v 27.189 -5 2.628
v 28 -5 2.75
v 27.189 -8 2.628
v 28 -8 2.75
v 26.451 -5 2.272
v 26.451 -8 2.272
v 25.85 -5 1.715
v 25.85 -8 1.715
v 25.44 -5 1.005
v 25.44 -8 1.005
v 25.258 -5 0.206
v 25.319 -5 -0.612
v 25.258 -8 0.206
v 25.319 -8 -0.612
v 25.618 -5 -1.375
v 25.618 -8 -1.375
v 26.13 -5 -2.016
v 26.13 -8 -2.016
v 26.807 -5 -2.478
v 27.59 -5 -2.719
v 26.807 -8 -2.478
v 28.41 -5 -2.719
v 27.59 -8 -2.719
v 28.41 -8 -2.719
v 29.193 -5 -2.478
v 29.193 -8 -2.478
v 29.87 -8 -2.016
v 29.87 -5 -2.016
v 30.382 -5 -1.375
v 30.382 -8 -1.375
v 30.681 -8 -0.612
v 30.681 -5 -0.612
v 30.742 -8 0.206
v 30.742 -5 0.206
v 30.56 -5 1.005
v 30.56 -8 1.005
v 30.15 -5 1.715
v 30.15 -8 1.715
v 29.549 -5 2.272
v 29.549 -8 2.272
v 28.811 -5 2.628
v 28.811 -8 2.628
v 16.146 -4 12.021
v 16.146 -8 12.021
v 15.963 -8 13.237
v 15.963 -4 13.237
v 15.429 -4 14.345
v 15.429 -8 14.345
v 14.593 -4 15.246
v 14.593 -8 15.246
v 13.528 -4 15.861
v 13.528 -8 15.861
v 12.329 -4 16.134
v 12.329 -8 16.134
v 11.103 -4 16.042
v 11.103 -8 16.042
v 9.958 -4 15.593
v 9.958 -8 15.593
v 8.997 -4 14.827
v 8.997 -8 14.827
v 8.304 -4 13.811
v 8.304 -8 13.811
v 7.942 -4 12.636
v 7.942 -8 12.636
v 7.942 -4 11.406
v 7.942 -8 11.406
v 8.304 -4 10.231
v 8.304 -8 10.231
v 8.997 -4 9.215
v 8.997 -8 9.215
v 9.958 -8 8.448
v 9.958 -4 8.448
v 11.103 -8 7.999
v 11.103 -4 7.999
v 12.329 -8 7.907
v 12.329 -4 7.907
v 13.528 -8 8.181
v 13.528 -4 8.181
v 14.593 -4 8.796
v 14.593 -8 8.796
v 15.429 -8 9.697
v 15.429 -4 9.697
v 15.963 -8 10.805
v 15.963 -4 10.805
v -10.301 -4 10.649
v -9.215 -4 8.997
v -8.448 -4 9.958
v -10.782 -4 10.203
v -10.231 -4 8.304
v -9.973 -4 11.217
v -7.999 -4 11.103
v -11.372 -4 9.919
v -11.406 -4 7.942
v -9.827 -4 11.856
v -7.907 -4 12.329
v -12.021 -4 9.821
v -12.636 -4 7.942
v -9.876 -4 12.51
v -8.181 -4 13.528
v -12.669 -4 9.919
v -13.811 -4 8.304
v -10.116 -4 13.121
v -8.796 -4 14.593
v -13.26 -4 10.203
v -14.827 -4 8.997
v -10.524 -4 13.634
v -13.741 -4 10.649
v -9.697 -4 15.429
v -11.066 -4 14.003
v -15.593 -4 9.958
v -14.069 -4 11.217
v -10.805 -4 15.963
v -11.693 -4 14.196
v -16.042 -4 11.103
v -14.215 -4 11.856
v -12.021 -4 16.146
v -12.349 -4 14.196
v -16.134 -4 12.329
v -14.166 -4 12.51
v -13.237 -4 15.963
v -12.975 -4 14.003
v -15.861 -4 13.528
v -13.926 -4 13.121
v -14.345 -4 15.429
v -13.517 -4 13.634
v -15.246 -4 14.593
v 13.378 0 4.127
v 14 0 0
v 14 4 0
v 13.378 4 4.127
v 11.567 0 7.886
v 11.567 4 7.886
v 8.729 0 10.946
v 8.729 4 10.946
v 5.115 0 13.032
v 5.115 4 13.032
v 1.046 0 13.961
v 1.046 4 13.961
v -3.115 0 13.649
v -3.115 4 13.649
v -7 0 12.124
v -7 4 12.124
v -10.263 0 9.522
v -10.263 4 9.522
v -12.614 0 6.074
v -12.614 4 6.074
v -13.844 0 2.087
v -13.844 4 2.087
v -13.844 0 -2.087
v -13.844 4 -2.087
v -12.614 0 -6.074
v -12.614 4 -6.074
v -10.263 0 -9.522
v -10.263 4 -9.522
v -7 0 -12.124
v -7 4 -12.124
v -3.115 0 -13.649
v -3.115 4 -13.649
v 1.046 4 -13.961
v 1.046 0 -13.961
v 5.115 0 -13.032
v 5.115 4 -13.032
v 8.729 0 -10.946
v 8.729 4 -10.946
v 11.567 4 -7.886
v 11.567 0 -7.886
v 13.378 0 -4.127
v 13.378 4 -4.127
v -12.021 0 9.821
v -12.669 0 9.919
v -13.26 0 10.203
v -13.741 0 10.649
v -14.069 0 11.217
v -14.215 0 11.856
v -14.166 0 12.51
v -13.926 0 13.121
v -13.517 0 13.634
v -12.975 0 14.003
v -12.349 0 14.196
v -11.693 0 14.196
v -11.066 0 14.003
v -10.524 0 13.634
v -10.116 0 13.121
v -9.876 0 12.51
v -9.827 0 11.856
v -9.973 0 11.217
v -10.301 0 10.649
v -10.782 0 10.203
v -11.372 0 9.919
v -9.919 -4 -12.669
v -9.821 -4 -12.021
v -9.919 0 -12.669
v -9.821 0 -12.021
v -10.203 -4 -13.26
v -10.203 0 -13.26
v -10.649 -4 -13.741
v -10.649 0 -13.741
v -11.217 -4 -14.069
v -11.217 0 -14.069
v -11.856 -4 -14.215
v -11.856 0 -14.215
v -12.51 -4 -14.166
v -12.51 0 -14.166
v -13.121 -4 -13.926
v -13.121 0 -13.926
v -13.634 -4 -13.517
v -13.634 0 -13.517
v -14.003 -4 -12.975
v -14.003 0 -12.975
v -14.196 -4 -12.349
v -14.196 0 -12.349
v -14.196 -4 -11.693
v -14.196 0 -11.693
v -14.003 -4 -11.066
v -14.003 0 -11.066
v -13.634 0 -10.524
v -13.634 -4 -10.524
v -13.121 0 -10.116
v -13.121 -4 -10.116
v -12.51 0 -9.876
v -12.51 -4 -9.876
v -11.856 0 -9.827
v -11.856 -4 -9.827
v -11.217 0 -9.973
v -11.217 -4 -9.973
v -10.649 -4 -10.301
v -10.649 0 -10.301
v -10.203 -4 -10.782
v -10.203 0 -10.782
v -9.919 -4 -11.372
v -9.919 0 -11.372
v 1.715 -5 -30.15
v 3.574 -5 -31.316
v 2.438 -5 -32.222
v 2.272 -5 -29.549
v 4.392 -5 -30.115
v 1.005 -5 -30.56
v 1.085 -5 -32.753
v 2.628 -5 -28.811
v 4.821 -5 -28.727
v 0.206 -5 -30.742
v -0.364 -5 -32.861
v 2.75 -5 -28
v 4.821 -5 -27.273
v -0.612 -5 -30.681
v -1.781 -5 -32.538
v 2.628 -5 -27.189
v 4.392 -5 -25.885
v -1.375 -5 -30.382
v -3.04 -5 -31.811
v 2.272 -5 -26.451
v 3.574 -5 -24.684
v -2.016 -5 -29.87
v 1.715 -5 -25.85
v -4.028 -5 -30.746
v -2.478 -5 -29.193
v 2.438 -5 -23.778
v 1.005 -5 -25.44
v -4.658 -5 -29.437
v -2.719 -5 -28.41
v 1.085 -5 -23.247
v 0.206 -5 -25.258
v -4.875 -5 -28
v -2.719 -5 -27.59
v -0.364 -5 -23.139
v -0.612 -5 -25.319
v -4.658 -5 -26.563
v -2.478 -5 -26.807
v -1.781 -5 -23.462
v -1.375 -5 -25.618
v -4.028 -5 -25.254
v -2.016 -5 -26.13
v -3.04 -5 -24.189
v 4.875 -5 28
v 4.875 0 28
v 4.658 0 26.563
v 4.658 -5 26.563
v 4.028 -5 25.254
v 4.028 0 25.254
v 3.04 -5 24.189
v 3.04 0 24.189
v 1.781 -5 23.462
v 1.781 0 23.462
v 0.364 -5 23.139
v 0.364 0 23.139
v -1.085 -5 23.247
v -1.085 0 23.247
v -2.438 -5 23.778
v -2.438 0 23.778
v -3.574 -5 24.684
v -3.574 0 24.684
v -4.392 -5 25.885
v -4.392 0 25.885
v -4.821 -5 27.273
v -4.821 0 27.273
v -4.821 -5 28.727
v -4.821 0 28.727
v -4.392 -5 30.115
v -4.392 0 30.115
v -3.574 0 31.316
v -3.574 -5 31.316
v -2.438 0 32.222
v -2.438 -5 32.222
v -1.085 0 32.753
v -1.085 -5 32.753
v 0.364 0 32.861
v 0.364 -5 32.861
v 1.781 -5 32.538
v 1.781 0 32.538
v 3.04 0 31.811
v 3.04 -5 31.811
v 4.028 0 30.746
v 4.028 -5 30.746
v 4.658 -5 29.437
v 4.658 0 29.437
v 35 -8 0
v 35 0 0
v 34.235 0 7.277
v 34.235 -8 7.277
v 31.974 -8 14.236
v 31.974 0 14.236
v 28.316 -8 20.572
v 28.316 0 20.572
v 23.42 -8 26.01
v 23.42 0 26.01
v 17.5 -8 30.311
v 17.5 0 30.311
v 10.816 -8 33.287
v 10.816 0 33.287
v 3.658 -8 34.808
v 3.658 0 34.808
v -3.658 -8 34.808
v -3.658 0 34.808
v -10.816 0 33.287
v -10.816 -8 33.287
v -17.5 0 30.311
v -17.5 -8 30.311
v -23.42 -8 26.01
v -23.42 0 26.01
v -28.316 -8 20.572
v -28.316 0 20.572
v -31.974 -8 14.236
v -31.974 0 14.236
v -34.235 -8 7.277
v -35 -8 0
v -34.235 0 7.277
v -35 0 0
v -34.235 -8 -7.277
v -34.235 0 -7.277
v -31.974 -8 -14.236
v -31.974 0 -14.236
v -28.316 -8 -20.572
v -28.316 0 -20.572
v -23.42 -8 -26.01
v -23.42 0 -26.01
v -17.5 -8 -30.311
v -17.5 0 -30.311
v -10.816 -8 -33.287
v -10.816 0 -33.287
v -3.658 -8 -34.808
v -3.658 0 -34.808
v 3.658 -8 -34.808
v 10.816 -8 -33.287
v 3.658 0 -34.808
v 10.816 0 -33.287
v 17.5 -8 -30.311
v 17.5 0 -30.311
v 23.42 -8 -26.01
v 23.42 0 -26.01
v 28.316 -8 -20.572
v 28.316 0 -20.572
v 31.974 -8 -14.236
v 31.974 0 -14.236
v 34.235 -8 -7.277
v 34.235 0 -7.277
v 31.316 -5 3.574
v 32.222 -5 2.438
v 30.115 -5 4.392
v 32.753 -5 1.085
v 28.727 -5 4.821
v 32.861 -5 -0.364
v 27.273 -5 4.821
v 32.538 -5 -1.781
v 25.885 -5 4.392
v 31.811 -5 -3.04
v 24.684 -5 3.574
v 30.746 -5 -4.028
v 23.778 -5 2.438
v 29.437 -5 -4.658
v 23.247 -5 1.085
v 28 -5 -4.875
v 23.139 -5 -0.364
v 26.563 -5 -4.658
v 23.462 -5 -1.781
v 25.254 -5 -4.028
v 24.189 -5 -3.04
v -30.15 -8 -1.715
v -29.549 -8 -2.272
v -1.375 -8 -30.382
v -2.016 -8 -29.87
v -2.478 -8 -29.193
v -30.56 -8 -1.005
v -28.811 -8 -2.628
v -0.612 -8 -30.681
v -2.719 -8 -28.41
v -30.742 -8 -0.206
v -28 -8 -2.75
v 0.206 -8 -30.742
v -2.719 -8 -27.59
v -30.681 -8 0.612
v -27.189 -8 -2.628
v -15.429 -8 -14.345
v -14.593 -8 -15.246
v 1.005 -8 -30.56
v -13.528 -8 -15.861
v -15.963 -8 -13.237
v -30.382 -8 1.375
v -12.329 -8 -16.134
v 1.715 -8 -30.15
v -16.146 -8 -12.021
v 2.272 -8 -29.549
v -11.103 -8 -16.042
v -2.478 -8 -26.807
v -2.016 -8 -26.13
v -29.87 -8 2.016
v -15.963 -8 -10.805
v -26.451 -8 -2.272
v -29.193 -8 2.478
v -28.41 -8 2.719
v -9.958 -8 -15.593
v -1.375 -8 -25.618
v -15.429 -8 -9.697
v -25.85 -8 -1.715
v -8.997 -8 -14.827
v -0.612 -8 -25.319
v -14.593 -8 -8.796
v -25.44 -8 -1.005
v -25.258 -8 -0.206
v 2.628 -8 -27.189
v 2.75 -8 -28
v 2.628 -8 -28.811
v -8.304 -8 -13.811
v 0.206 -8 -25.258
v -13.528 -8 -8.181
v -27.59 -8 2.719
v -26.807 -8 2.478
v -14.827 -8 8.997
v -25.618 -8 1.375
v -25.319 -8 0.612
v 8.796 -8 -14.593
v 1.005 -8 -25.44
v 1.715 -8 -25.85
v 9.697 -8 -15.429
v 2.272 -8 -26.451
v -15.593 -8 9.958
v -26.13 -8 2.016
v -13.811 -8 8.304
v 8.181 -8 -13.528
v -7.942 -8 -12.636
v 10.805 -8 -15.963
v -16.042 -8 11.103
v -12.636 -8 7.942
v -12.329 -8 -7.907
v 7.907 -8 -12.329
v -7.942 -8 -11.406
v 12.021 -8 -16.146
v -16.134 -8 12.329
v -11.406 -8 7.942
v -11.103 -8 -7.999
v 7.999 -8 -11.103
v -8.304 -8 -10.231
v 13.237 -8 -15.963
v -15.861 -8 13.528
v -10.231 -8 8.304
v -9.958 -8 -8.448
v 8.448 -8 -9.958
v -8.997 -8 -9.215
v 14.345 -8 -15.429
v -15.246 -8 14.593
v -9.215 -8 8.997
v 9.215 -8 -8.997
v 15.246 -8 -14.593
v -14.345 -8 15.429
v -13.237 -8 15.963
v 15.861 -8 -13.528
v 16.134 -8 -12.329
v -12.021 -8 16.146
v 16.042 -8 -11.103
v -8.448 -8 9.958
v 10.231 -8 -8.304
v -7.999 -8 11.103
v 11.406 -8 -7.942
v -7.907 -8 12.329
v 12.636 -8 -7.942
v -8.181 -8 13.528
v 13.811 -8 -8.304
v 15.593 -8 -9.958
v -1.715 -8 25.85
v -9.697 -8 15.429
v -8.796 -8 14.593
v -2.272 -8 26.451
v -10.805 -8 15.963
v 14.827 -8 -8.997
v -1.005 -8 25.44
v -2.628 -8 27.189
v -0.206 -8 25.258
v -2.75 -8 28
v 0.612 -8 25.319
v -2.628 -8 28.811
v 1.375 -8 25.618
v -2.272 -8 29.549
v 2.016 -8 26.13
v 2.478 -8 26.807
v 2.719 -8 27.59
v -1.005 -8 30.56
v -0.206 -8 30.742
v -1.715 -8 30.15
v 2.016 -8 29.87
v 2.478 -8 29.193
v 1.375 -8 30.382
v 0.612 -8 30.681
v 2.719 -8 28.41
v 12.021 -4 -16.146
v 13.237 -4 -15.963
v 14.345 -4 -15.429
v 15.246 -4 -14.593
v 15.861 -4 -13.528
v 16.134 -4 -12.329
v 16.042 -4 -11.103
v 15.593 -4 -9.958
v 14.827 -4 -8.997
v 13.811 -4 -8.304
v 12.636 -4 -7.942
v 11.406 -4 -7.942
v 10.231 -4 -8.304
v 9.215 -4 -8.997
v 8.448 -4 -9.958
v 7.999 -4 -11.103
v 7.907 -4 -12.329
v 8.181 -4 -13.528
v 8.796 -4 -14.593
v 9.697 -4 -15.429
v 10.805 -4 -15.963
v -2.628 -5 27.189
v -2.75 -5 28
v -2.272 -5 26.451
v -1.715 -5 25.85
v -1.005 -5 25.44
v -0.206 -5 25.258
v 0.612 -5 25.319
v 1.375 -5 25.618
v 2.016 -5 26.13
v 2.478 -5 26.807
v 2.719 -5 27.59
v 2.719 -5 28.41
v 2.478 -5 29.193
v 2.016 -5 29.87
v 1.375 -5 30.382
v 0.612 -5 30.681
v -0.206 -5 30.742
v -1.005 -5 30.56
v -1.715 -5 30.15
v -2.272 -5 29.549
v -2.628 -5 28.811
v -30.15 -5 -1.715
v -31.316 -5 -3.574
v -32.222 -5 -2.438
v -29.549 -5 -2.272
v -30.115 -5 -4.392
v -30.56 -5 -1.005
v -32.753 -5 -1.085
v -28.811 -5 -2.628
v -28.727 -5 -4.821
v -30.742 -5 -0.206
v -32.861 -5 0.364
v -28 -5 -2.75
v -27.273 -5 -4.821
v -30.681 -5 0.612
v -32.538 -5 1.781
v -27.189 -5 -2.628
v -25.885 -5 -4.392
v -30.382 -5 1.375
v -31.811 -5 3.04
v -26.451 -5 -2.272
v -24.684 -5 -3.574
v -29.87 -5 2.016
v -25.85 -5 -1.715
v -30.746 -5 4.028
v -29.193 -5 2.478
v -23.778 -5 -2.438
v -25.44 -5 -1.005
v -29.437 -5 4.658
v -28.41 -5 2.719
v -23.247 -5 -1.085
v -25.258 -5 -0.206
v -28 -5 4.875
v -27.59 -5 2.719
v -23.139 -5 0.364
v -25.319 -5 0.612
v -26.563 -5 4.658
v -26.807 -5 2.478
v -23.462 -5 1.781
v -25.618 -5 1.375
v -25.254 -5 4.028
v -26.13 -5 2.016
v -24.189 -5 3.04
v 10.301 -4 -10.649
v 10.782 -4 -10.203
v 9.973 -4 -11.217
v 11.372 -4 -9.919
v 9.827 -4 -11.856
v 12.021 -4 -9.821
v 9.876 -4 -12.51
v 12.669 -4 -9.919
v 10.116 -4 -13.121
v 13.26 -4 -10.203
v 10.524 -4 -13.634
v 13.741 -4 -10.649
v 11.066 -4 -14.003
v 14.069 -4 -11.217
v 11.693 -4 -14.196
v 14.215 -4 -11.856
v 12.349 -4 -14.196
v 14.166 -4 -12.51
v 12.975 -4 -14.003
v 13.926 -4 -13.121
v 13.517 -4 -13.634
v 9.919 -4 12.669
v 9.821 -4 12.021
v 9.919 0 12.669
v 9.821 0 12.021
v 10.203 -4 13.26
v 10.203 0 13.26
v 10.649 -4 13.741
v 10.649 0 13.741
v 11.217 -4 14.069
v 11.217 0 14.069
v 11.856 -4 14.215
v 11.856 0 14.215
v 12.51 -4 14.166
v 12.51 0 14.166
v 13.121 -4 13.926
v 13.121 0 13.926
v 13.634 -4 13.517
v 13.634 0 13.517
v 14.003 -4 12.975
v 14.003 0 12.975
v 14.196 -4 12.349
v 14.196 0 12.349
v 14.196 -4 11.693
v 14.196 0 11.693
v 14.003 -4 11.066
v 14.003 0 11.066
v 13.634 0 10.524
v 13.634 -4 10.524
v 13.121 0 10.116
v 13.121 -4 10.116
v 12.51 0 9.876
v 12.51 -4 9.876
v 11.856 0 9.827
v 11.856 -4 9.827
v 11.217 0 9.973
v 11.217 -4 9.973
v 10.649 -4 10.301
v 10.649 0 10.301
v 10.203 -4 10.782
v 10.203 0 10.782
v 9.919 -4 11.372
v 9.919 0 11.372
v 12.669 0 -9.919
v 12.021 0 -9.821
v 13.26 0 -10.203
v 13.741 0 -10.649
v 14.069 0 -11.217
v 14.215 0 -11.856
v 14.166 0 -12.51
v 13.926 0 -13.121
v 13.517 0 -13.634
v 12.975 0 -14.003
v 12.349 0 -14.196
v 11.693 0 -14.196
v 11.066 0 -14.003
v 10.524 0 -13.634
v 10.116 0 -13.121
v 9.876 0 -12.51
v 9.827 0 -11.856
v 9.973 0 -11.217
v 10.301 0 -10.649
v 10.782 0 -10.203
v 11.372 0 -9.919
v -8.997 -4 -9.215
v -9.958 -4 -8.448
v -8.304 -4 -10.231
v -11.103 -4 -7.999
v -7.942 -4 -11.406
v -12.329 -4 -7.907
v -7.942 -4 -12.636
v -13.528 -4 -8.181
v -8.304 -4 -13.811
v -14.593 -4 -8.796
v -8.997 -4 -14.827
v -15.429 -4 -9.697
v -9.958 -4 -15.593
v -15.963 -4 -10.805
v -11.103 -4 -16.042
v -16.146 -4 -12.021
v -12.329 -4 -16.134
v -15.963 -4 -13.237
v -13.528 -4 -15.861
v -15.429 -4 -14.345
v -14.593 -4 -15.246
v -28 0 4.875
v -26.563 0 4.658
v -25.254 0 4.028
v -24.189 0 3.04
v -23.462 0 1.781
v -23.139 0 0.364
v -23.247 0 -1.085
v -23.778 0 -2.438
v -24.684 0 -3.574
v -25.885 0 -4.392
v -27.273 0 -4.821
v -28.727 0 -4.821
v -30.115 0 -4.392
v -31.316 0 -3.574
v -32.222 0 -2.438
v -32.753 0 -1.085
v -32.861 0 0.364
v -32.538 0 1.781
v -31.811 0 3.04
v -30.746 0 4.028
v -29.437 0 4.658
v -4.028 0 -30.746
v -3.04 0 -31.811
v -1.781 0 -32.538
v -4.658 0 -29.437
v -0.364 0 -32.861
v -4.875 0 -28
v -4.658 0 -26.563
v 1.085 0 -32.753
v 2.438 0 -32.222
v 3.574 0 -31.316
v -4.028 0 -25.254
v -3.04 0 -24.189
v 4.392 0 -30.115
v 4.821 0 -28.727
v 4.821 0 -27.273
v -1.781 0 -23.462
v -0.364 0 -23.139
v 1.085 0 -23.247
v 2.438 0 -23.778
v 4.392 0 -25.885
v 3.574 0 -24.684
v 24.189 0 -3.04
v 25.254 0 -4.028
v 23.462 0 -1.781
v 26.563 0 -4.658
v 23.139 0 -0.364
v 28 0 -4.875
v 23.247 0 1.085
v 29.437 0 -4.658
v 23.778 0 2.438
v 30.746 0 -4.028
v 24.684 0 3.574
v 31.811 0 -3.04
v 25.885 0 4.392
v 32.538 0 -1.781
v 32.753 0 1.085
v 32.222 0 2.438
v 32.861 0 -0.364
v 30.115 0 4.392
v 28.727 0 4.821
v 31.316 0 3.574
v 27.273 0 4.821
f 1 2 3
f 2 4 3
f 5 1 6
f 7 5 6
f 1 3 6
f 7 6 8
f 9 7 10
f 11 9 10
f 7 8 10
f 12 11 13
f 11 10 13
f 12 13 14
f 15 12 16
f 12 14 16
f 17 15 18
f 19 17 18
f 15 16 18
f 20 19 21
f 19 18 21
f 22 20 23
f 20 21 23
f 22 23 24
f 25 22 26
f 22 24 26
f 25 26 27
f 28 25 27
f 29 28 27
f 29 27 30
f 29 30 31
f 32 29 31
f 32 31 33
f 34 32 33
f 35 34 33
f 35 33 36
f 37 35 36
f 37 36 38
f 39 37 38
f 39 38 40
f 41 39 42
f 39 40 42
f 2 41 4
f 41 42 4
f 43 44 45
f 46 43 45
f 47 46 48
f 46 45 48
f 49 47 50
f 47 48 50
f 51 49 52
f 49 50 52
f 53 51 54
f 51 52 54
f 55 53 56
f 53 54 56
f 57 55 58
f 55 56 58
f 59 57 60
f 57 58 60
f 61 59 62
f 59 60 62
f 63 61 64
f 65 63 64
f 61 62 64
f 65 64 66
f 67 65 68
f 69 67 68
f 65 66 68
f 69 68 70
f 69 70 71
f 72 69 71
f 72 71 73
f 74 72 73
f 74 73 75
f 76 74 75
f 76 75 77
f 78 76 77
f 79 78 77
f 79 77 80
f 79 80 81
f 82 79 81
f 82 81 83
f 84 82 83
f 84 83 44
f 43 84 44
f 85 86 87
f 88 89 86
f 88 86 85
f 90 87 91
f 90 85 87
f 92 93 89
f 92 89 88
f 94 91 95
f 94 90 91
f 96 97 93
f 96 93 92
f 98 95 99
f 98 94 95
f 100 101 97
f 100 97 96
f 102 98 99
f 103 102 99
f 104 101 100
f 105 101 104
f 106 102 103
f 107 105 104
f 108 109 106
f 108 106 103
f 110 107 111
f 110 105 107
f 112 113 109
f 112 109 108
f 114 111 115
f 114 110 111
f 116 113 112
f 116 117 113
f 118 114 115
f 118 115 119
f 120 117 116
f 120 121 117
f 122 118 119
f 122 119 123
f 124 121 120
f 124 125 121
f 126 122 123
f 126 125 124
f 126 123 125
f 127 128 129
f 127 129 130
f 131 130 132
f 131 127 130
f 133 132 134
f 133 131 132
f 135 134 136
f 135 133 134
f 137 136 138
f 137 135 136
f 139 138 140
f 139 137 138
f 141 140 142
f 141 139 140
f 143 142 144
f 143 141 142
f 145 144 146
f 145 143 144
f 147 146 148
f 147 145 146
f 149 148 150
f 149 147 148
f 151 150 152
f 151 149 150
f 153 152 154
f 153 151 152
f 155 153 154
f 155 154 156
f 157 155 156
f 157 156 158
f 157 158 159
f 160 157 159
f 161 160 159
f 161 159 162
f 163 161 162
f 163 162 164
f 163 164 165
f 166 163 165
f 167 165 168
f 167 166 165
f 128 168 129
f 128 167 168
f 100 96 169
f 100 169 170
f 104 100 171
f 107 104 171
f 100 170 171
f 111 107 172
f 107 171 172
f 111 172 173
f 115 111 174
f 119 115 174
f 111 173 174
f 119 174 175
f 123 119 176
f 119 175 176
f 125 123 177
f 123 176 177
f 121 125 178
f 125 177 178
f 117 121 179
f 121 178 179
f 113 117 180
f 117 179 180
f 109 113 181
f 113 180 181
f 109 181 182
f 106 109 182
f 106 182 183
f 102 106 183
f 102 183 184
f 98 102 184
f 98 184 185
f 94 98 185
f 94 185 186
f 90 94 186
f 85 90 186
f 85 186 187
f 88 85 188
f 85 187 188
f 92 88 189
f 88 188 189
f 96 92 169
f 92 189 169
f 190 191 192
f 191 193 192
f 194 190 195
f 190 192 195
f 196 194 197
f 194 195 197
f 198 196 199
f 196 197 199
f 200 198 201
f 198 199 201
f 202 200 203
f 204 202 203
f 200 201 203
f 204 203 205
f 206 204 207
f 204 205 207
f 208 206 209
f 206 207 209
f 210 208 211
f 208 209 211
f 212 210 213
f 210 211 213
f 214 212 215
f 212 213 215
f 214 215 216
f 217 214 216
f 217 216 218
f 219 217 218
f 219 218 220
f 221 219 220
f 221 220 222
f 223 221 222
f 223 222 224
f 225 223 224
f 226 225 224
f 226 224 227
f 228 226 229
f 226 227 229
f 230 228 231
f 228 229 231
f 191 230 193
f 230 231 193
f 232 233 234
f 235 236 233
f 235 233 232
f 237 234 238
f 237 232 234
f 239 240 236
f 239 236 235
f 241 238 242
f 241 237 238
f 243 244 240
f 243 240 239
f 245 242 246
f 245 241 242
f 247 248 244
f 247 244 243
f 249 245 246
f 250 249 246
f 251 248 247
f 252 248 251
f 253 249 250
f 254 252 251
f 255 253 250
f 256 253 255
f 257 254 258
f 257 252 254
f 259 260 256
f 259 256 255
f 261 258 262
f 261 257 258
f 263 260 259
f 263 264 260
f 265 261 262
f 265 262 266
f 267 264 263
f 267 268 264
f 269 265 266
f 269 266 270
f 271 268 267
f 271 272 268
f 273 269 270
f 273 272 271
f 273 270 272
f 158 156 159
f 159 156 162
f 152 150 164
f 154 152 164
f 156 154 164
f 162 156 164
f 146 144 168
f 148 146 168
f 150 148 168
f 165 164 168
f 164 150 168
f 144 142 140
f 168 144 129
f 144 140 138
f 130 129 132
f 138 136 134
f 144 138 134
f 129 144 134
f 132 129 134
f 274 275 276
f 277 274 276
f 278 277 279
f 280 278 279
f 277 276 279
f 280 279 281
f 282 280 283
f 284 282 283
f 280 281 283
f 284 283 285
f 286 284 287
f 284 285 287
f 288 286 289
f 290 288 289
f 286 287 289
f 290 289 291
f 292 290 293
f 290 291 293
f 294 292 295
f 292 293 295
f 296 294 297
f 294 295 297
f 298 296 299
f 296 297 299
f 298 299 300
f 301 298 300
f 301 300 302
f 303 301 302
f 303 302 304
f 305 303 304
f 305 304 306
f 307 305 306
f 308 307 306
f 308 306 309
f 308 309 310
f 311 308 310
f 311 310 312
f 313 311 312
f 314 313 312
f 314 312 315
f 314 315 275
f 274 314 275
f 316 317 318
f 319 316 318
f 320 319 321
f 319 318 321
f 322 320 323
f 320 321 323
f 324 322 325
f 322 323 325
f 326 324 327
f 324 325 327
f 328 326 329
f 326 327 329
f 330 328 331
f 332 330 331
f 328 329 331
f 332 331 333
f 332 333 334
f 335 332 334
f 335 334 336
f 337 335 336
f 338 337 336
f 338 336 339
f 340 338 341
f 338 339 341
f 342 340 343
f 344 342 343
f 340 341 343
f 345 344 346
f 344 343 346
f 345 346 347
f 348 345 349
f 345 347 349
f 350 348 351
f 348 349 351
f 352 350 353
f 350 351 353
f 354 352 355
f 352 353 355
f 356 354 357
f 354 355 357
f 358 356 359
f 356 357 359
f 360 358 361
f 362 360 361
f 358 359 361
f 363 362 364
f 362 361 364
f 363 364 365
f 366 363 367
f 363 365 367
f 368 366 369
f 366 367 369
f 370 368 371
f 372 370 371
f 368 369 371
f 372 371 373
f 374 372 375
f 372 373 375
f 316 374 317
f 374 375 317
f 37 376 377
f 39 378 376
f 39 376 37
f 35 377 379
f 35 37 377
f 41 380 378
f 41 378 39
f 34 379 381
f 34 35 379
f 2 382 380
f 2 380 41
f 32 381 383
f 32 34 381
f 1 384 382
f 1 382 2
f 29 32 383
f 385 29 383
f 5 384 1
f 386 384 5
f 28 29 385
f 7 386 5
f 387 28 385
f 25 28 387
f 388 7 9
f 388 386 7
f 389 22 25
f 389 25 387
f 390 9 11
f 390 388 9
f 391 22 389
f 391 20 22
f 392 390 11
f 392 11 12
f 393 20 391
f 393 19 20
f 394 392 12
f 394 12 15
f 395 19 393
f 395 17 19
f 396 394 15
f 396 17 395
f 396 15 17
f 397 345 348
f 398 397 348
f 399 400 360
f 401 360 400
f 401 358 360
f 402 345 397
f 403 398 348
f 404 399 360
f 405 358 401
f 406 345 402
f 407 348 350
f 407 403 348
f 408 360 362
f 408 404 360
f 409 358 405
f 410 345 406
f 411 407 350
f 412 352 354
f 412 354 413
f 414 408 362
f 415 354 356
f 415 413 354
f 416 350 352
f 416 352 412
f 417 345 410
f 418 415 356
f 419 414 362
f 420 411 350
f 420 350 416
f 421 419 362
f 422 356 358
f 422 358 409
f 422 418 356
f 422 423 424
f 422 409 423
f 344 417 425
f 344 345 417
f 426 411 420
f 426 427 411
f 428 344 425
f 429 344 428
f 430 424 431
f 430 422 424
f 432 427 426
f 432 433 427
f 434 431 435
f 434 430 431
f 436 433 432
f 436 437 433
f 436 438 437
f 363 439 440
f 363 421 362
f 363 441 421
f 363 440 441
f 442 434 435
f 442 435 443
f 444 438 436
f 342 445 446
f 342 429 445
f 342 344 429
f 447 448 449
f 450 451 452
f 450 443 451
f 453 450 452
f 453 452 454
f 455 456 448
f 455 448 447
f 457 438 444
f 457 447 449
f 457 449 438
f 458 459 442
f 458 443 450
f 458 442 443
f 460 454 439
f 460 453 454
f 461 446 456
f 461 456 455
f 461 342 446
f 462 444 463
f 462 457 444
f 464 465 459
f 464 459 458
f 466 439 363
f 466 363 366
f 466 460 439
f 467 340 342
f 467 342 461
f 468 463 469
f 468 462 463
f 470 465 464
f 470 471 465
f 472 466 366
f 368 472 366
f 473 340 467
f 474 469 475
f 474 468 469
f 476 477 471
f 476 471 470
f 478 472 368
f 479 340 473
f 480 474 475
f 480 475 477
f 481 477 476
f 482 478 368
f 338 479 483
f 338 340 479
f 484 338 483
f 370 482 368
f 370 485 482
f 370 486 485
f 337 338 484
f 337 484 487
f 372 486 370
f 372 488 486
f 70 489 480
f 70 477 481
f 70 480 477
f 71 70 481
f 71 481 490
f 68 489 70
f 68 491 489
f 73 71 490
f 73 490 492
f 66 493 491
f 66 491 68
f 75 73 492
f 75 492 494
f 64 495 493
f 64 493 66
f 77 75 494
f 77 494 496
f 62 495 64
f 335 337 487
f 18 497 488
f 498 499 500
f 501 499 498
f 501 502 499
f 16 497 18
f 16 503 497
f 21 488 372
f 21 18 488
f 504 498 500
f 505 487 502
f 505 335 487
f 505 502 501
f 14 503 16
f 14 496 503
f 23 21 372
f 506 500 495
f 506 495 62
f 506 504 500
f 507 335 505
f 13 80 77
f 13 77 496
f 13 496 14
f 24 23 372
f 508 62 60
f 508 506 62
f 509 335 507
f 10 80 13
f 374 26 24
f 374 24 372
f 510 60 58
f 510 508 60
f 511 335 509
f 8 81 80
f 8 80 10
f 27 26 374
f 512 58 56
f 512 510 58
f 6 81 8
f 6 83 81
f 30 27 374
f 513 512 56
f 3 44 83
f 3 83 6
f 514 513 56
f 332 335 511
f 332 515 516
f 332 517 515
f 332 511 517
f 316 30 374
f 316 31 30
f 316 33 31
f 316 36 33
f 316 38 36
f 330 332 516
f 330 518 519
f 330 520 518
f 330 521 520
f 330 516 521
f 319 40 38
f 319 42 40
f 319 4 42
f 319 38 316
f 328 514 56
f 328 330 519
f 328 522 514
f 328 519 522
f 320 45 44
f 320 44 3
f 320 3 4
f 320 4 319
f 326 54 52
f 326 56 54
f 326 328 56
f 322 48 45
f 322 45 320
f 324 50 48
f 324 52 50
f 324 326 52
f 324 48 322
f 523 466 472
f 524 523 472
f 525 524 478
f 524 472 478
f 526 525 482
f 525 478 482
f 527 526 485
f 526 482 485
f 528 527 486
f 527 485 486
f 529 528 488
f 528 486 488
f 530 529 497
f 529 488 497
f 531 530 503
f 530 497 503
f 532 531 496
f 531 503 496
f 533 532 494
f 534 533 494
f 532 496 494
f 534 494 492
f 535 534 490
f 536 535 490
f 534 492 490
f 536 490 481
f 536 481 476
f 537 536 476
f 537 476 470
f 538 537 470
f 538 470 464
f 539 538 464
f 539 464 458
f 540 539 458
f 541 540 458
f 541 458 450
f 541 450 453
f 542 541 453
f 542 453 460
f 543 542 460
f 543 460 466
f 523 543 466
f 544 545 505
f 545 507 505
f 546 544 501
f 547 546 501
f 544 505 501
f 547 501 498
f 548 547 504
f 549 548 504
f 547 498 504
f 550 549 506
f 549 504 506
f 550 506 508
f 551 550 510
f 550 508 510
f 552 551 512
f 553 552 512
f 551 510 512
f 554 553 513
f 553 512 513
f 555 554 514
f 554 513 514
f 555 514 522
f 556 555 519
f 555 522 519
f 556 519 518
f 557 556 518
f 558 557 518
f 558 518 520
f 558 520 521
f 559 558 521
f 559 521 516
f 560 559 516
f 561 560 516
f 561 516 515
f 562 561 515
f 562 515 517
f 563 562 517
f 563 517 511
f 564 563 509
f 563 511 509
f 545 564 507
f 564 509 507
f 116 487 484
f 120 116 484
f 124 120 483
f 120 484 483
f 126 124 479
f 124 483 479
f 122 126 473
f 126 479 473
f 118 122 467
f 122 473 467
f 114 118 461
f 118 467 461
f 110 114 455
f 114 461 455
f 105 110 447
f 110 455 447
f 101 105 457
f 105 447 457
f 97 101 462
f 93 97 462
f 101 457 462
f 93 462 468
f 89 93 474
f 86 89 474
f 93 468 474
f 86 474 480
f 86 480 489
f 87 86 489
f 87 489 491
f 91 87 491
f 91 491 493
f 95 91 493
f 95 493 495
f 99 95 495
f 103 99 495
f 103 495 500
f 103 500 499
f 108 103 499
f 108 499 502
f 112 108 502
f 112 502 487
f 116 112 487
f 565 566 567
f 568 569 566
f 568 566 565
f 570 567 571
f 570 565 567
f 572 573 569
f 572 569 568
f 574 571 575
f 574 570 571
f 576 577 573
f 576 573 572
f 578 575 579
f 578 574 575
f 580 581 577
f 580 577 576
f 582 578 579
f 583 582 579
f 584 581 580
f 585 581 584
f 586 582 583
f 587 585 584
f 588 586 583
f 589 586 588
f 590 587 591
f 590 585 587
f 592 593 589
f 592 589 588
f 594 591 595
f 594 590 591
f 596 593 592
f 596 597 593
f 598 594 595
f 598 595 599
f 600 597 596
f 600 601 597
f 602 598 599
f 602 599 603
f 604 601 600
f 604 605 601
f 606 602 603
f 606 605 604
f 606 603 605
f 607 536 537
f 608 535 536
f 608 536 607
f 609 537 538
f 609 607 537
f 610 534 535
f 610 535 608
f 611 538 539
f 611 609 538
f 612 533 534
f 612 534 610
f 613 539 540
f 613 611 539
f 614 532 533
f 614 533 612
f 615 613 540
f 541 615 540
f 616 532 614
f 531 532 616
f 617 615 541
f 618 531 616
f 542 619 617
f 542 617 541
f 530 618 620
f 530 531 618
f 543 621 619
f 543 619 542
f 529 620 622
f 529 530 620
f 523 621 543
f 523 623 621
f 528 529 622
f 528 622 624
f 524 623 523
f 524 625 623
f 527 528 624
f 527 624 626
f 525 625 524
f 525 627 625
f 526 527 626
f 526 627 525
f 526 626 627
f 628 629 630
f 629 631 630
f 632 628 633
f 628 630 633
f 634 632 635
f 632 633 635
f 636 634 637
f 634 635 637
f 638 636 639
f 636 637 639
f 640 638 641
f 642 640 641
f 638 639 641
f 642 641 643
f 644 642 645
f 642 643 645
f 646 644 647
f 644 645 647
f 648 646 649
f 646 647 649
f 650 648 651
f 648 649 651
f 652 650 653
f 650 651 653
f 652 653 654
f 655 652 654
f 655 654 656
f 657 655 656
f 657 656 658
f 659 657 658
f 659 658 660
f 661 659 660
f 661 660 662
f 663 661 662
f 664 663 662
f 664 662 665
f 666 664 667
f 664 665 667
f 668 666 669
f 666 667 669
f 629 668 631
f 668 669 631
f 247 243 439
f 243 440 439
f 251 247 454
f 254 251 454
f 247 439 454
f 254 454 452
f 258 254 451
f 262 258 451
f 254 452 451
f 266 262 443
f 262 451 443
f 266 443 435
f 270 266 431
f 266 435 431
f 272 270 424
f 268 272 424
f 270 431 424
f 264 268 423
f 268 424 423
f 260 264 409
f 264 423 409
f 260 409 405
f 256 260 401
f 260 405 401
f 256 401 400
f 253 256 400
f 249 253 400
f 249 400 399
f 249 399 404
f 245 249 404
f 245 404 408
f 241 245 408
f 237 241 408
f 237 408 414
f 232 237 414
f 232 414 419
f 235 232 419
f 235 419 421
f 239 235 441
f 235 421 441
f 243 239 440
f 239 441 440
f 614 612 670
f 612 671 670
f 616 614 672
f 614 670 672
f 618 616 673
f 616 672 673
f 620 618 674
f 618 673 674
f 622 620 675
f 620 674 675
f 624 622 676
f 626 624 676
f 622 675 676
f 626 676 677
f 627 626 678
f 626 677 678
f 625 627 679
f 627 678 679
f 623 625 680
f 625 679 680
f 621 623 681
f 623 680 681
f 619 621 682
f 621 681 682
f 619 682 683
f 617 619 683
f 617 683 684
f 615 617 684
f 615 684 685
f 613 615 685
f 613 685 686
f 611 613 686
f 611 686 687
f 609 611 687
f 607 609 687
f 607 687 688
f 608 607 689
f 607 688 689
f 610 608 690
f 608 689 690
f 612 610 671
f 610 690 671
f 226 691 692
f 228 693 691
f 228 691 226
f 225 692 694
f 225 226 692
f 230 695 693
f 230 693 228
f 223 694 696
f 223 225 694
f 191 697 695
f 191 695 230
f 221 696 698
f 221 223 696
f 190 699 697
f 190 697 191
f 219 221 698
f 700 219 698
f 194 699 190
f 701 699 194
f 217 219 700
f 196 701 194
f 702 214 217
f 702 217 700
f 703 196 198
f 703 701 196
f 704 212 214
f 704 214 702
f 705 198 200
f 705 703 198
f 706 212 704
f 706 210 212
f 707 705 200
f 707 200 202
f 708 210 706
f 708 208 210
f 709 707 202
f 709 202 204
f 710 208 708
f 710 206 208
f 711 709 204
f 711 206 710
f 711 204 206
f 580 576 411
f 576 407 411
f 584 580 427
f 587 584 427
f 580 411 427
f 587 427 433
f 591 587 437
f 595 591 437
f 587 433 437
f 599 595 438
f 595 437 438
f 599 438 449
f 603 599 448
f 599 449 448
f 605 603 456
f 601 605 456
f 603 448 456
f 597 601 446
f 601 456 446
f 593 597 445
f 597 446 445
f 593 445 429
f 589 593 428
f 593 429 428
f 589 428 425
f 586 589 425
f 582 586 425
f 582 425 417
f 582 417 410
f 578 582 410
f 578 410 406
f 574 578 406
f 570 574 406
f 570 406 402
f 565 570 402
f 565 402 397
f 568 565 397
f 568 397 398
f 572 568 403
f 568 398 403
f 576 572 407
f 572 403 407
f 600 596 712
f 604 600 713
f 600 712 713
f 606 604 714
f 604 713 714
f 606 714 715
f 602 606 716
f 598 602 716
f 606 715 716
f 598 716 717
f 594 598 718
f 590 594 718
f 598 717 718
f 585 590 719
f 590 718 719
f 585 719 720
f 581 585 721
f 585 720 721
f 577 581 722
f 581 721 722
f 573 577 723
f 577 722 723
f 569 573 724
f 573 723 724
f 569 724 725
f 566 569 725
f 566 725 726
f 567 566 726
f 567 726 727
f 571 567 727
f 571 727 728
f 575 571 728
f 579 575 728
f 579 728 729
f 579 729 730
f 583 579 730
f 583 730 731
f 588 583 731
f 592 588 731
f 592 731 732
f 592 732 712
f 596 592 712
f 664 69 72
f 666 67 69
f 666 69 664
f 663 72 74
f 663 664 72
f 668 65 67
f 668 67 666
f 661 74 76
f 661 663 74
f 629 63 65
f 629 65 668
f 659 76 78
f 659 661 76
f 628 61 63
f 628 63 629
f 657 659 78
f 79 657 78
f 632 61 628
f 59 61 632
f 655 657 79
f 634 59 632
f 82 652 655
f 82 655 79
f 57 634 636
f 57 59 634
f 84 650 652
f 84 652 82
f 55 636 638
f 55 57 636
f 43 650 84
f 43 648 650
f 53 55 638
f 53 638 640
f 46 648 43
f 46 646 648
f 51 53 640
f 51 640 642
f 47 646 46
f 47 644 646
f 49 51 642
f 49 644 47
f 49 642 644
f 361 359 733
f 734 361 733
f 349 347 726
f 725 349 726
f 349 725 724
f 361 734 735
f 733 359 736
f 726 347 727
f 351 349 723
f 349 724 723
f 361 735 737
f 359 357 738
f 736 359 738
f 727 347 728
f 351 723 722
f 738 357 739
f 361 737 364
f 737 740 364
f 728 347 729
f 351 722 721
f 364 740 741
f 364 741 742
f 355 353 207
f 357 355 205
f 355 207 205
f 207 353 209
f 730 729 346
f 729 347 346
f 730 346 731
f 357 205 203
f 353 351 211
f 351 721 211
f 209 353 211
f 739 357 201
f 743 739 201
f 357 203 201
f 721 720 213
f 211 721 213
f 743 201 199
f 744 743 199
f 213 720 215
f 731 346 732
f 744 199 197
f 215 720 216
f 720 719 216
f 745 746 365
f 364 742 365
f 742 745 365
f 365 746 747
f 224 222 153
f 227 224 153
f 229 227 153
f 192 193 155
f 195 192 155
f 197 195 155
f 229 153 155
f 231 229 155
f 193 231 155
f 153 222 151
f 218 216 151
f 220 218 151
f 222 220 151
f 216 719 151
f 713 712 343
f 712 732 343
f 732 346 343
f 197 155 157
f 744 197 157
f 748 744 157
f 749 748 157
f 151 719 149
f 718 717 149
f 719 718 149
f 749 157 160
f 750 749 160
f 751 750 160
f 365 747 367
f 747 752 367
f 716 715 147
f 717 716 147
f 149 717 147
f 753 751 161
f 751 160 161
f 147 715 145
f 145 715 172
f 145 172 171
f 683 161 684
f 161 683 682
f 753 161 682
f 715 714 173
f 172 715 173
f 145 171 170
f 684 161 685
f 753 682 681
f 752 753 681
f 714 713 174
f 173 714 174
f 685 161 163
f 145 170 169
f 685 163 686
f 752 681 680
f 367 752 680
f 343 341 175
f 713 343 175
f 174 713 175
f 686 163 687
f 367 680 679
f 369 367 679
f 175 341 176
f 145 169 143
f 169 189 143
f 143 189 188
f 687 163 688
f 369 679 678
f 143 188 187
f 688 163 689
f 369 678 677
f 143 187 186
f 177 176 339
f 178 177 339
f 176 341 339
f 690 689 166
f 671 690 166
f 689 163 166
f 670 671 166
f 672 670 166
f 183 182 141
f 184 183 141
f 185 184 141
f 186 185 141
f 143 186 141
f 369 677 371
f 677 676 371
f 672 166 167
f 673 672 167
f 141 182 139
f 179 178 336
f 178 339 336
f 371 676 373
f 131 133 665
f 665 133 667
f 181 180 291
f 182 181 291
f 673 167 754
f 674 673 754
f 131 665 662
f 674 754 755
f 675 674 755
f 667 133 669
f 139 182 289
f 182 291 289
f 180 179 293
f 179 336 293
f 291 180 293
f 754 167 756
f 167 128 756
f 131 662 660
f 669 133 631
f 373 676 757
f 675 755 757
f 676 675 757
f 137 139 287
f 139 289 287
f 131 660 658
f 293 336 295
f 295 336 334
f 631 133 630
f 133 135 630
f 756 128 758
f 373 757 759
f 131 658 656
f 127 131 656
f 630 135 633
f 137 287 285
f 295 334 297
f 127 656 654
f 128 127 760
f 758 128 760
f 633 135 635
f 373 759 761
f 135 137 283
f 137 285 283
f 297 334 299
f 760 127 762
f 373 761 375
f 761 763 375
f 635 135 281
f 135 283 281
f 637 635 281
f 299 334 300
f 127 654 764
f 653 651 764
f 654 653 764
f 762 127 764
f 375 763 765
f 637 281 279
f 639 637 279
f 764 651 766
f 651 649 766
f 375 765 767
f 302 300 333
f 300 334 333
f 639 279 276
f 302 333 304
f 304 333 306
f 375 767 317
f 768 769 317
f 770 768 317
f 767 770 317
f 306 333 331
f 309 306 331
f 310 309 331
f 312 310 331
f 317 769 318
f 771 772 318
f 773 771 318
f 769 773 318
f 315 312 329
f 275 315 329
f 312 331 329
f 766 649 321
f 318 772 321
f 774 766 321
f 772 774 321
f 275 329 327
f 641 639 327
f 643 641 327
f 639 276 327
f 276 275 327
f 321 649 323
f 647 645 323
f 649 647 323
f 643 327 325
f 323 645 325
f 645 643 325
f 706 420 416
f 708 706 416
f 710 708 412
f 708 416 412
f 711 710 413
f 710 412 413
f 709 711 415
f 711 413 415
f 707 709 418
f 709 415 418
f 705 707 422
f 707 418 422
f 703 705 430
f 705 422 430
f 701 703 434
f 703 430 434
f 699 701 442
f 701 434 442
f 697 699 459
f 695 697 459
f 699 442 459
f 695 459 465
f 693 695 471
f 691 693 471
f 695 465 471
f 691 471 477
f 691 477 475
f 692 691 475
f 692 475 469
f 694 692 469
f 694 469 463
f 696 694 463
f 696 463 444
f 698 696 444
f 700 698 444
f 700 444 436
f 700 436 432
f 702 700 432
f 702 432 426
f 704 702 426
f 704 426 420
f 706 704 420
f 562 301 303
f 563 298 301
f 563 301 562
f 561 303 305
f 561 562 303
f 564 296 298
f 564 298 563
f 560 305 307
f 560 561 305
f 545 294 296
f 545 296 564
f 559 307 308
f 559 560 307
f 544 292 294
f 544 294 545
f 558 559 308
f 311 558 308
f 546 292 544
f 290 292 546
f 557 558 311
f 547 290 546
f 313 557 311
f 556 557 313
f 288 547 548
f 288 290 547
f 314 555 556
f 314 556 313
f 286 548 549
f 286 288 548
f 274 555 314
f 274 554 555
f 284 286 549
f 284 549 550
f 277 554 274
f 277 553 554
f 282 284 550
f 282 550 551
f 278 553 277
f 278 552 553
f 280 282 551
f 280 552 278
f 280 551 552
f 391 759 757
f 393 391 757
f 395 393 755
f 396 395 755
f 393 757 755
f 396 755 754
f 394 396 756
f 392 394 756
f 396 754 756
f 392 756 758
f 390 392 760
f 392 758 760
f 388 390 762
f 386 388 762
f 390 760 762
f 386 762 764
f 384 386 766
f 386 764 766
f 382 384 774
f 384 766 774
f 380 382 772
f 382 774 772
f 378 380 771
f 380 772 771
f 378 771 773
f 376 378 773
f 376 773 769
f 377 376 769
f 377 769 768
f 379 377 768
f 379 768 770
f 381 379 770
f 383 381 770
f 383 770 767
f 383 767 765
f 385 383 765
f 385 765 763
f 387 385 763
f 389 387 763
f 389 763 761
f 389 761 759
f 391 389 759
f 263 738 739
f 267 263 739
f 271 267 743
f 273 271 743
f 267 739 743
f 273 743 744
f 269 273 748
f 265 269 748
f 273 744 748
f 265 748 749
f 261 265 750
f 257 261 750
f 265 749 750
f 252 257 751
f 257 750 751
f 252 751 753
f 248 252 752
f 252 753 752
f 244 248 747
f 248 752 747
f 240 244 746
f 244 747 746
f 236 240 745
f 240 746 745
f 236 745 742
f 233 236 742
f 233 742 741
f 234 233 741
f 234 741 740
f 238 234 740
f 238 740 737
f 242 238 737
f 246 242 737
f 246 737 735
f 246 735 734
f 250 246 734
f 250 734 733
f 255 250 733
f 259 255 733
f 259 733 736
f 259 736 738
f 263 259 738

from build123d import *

# Parameters (mm, degrees)
F0_R            = 35
F0_R_2          = 14
F1_DEPTH        = 8
F2_DEPTH        = 4
F4_D            = 4.4
F4_CBORE_D      = 8.25
F4_CBORE_DEPTH  = 4
F4_COPIES_COUNT = 4
F5_D            = 5.5
F5_CBORE_D      = 9.75
F5_CBORE_DEPTH  = 5
F5_COPIES_COUNT = 4


# Not quite as in the source:
# - a pattern or mirror of a feature is missing from the dataset's text; its kind, count and spacing are read off the source's solid


with BuildPart() as f1:
    # F0 (on Front) → F1 (new body)
    with BuildSketch(Plane.XZ):
        Circle(F0_R)
        Circle(F0_R_2, mode=Mode.SUBTRACT)
        Circle(F0_R_2)
    extrude(amount=F1_DEPTH)

    # F0 (on Front) → F2 (join)
    with BuildSketch(Plane.XZ):
        Circle(F0_R_2)
    extrude(amount=-F2_DEPTH)

    # F4 (through all)
    with Locations(Plane.XZ.offset(8)):
        with Locations((12.0208152802, 12.0208152802)):
            f4 = CounterBoreHole(F4_D / 2, F4_CBORE_D / 2, F4_CBORE_DEPTH)

    # F4_copies: F4 ×4 about axis
    f4_copies_axis = Axis((0, 0, 0), (0, 1, 0))
    for i in range(1, F4_COPIES_COUNT):
        add(f4.rotate(f4_copies_axis, i * 360 / F4_COPIES_COUNT), mode=Mode.SUBTRACT)

    # F5 (through all)
    with Locations(Plane(origin=(0, 0, 0), x_dir=(1, 0, 0), z_dir=(0, 1, 0))):
        with Locations((0, -28)):
            f5 = CounterBoreHole(F5_D / 2, F5_CBORE_D / 2, F5_CBORE_DEPTH)

    # F5_copies: F5 ×4 about axis
    f5_copies_axis = Axis((0, 0, 0), (0, 1, 0))
    for i in range(1, F5_COPIES_COUNT):
        add(f5.rotate(f5_copies_axis, i * 360 / F5_COPIES_COUNT), mode=Mode.SUBTRACT)


solid = f1.part
